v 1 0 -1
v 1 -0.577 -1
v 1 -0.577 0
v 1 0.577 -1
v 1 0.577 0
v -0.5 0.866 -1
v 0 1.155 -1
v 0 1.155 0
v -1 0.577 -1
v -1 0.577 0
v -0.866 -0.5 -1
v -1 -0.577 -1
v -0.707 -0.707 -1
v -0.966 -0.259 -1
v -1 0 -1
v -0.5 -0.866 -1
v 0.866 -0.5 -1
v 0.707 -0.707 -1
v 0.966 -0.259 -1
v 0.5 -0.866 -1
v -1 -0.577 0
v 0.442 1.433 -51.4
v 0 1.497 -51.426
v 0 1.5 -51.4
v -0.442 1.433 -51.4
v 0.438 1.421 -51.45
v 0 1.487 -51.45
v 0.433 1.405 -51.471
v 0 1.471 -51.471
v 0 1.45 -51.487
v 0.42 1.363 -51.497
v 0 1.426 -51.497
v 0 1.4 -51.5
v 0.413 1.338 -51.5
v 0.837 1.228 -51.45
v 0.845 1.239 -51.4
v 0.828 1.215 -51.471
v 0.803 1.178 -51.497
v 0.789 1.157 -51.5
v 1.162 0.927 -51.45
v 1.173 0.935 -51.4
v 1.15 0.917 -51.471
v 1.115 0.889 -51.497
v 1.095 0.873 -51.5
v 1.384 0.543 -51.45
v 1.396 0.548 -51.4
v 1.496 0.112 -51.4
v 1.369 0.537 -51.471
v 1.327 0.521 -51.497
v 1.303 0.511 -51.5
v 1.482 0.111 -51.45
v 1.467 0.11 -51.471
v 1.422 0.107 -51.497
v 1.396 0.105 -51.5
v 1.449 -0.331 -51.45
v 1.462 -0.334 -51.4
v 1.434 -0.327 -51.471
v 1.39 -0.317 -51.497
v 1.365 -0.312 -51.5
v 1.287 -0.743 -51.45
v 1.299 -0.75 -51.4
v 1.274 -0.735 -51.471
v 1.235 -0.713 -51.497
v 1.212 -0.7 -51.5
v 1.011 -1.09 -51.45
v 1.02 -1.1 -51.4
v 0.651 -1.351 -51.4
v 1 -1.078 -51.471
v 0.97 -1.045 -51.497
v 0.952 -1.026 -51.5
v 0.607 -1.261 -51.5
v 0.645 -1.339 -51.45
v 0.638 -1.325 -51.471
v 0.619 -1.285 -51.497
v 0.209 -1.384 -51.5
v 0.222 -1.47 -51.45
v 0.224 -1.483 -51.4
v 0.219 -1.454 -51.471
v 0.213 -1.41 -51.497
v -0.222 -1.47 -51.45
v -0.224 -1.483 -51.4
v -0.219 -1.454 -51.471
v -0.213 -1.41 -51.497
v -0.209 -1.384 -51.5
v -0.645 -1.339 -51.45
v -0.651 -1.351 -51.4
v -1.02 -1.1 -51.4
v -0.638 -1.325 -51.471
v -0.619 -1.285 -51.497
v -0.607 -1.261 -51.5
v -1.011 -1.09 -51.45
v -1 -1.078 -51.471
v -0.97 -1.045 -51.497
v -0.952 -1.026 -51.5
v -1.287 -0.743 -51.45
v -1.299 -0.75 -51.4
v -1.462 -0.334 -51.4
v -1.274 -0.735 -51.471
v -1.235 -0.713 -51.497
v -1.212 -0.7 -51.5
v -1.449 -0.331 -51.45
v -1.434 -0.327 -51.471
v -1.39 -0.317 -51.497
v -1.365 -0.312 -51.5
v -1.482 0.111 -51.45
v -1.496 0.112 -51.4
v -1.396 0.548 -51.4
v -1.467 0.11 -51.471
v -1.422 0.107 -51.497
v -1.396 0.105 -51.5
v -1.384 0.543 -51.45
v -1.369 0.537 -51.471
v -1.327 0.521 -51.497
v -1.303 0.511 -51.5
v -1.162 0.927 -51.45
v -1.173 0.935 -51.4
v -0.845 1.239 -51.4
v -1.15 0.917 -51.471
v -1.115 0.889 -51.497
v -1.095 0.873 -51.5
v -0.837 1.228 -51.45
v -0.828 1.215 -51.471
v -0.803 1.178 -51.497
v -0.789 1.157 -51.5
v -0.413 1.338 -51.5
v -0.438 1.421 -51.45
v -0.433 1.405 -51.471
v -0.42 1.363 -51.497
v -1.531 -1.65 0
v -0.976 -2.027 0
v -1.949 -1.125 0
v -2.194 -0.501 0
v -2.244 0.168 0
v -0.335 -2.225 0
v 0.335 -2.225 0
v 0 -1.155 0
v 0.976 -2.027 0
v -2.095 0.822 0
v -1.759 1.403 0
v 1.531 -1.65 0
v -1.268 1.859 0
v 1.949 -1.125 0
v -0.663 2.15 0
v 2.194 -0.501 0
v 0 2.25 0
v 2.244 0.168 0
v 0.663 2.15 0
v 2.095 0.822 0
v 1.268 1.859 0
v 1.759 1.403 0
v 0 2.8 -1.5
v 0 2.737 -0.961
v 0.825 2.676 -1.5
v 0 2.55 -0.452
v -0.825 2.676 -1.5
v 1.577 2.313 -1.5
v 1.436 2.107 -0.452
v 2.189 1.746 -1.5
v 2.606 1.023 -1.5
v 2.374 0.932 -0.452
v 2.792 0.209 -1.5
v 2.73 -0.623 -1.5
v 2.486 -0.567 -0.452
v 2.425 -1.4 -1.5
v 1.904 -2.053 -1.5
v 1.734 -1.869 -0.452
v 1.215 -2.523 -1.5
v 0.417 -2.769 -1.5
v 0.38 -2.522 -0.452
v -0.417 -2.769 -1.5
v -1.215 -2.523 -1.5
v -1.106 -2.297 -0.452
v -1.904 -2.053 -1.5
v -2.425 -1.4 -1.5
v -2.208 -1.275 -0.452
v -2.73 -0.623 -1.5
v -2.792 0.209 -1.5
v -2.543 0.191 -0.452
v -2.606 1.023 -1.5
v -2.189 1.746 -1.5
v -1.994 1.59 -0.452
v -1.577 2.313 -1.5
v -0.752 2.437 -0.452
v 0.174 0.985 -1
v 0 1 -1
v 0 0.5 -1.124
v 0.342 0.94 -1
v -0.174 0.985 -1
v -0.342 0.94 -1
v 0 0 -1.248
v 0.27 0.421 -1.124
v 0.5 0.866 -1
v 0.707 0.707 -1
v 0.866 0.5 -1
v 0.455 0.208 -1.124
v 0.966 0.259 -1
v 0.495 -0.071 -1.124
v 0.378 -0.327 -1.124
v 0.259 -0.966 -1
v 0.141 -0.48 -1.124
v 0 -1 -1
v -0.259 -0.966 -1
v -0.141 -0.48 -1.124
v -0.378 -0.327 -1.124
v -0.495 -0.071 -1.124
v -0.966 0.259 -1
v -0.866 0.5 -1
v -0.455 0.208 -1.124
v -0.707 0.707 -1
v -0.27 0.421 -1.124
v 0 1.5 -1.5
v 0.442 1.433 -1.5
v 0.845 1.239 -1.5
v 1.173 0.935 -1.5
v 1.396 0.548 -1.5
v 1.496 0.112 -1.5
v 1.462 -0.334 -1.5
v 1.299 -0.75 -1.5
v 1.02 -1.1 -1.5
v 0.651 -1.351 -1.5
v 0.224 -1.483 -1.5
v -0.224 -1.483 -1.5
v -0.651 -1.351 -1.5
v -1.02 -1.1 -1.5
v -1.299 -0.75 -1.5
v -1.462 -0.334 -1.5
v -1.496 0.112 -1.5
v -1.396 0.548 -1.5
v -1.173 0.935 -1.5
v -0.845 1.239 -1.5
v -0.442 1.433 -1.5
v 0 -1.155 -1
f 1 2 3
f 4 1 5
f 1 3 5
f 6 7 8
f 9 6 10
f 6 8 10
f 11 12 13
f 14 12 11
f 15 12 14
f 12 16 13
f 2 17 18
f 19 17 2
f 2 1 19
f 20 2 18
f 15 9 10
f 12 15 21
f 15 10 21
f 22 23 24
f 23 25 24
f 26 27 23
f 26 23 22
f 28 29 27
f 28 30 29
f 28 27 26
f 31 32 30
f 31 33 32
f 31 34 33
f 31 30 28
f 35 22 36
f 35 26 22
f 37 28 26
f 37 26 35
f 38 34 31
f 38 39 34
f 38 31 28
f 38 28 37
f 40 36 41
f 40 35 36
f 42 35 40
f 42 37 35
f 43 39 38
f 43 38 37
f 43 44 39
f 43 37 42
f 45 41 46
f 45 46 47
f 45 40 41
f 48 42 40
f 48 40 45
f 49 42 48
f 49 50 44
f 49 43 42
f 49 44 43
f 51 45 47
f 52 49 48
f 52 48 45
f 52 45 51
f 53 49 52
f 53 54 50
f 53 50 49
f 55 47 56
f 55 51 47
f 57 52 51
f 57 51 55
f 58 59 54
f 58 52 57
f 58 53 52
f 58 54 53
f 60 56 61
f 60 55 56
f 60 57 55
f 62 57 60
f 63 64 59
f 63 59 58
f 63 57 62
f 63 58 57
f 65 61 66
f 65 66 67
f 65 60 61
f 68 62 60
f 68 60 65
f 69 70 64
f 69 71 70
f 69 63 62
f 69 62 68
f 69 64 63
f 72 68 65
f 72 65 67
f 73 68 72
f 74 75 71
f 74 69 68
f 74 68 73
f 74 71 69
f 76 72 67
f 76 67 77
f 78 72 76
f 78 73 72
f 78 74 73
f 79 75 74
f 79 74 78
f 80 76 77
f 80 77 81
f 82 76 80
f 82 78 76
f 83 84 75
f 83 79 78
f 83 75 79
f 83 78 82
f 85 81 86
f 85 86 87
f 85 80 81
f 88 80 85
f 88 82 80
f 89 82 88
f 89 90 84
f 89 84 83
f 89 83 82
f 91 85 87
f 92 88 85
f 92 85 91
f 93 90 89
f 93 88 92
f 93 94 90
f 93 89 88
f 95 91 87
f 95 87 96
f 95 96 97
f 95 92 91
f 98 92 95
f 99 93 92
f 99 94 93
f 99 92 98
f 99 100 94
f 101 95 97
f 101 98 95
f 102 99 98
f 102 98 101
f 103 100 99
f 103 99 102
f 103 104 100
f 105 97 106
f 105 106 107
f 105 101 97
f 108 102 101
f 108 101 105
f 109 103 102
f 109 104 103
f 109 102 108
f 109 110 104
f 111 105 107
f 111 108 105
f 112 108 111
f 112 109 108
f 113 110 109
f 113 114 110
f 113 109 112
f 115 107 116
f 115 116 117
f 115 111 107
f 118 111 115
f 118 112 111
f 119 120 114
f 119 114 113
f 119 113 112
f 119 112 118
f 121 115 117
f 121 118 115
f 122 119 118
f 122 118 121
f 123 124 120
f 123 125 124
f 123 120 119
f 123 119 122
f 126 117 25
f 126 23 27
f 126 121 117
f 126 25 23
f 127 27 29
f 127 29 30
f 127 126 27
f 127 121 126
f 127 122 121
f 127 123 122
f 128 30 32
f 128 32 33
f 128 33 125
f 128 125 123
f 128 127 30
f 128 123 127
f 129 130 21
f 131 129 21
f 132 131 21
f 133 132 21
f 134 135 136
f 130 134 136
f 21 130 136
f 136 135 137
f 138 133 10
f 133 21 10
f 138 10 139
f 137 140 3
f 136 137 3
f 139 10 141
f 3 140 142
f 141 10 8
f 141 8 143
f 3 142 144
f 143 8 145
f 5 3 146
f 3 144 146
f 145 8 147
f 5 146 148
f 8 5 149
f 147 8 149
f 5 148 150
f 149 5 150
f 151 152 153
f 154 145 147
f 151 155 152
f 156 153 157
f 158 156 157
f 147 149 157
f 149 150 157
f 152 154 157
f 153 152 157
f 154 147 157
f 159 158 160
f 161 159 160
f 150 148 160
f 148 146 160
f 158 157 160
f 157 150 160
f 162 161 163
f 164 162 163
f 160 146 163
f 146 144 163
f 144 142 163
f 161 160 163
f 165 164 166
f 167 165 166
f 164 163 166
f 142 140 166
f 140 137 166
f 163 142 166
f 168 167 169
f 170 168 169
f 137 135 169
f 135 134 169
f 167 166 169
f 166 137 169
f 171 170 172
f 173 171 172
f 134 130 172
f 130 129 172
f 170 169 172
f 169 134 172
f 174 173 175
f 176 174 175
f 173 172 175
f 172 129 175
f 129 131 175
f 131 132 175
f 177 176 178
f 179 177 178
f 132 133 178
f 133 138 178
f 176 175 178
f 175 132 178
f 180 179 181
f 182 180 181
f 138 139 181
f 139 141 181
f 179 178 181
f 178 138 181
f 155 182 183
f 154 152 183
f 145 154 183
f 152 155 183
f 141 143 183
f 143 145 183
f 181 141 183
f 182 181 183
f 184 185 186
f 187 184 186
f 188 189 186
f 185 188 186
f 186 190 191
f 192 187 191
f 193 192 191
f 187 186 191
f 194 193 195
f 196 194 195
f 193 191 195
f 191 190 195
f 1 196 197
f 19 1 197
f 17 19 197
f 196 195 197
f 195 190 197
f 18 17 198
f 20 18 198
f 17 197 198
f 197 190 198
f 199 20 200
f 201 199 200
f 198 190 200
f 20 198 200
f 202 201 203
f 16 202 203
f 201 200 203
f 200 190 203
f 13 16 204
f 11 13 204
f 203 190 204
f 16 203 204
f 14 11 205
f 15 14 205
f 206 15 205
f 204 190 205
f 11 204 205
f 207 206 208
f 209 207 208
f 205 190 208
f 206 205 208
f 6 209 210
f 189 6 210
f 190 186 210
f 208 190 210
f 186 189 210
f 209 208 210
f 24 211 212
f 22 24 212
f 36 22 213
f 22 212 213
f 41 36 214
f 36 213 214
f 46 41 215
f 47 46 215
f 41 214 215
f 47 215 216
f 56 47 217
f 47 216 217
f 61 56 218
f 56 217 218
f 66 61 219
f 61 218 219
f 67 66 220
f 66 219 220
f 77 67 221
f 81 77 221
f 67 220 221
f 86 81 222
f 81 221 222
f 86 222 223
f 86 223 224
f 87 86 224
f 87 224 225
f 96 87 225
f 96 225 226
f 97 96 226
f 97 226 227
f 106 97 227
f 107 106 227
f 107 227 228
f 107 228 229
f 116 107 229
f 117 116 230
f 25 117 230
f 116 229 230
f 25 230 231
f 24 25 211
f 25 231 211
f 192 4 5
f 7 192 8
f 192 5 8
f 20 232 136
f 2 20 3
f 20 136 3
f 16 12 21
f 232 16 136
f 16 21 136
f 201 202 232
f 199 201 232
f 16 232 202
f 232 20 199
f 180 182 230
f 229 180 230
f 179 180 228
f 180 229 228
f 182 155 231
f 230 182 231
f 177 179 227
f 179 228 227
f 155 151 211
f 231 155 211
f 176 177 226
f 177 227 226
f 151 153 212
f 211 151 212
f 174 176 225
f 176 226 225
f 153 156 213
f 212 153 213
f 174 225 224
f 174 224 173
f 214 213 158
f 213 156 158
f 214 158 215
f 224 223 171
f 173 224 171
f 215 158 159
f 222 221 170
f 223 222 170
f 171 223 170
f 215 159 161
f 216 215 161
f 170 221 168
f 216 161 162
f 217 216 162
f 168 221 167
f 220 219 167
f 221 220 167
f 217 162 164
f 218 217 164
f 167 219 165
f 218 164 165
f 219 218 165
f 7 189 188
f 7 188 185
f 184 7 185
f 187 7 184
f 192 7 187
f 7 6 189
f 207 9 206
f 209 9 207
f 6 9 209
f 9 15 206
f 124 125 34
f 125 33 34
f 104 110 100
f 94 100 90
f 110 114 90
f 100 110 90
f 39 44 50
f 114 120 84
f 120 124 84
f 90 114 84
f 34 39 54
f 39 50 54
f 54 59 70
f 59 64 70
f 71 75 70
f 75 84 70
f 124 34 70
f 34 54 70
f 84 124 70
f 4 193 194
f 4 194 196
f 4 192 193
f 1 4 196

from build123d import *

# Parameters (mm, degrees)
CUT_EXTRUDE_1_DEPTH = 1
FILLET_1_R          = 0.1


with BuildPart() as part:
    # 草图1 → 旋转2 (revolve)
    with BuildSketch(Plane(origin=(0, 0, 0), x_dir=(0, 0, -1), z_dir=(1, 0, 0))):
        with BuildLine():
            Line((0, 2.250343623), (0, 1))
            Line((0, 1), (0, 0))
            Line((0, 0), (1, 0))
            Line((1, 0), (1, 1))
            Line((1, 1), (1.248177586, 0))
            Line((1.248177586, 0), (51.5, 0))
            Line((51.5, 0), (51.5, 1.5))
            Line((51.5, 1.5), (1.5, 1.5))
            Line((1.5, 1.5), (1.5, 2.8))
            ThreePointArc((1.5, 2.8), (0.701231865, 2.658258964), (0, 2.250343623))
        make_face()
    revolve(axis=Axis((0, 0, 0), (0, 0, -1)))

    # 草图2 → 切除-拉伸1 (cut)
    with BuildSketch(Plane.XY):
        Polygon((0, 1.154700538), (-1, 0.577350269), (-1, -0.577350269), (0, -1.154700538), (1, -0.577350269), (1, 0.577350269), align=None)
    extrude(amount=-CUT_EXTRUDE_1_DEPTH, mode=Mode.SUBTRACT)

    # 圆角1
    fillet_1_edges = [part.edges().sort_by_distance(p)[0] for p in [
        (0, -1.5, -51.5),
    ]]
    fillet(fillet_1_edges, radius=FILLET_1_R)


solid = part.part
